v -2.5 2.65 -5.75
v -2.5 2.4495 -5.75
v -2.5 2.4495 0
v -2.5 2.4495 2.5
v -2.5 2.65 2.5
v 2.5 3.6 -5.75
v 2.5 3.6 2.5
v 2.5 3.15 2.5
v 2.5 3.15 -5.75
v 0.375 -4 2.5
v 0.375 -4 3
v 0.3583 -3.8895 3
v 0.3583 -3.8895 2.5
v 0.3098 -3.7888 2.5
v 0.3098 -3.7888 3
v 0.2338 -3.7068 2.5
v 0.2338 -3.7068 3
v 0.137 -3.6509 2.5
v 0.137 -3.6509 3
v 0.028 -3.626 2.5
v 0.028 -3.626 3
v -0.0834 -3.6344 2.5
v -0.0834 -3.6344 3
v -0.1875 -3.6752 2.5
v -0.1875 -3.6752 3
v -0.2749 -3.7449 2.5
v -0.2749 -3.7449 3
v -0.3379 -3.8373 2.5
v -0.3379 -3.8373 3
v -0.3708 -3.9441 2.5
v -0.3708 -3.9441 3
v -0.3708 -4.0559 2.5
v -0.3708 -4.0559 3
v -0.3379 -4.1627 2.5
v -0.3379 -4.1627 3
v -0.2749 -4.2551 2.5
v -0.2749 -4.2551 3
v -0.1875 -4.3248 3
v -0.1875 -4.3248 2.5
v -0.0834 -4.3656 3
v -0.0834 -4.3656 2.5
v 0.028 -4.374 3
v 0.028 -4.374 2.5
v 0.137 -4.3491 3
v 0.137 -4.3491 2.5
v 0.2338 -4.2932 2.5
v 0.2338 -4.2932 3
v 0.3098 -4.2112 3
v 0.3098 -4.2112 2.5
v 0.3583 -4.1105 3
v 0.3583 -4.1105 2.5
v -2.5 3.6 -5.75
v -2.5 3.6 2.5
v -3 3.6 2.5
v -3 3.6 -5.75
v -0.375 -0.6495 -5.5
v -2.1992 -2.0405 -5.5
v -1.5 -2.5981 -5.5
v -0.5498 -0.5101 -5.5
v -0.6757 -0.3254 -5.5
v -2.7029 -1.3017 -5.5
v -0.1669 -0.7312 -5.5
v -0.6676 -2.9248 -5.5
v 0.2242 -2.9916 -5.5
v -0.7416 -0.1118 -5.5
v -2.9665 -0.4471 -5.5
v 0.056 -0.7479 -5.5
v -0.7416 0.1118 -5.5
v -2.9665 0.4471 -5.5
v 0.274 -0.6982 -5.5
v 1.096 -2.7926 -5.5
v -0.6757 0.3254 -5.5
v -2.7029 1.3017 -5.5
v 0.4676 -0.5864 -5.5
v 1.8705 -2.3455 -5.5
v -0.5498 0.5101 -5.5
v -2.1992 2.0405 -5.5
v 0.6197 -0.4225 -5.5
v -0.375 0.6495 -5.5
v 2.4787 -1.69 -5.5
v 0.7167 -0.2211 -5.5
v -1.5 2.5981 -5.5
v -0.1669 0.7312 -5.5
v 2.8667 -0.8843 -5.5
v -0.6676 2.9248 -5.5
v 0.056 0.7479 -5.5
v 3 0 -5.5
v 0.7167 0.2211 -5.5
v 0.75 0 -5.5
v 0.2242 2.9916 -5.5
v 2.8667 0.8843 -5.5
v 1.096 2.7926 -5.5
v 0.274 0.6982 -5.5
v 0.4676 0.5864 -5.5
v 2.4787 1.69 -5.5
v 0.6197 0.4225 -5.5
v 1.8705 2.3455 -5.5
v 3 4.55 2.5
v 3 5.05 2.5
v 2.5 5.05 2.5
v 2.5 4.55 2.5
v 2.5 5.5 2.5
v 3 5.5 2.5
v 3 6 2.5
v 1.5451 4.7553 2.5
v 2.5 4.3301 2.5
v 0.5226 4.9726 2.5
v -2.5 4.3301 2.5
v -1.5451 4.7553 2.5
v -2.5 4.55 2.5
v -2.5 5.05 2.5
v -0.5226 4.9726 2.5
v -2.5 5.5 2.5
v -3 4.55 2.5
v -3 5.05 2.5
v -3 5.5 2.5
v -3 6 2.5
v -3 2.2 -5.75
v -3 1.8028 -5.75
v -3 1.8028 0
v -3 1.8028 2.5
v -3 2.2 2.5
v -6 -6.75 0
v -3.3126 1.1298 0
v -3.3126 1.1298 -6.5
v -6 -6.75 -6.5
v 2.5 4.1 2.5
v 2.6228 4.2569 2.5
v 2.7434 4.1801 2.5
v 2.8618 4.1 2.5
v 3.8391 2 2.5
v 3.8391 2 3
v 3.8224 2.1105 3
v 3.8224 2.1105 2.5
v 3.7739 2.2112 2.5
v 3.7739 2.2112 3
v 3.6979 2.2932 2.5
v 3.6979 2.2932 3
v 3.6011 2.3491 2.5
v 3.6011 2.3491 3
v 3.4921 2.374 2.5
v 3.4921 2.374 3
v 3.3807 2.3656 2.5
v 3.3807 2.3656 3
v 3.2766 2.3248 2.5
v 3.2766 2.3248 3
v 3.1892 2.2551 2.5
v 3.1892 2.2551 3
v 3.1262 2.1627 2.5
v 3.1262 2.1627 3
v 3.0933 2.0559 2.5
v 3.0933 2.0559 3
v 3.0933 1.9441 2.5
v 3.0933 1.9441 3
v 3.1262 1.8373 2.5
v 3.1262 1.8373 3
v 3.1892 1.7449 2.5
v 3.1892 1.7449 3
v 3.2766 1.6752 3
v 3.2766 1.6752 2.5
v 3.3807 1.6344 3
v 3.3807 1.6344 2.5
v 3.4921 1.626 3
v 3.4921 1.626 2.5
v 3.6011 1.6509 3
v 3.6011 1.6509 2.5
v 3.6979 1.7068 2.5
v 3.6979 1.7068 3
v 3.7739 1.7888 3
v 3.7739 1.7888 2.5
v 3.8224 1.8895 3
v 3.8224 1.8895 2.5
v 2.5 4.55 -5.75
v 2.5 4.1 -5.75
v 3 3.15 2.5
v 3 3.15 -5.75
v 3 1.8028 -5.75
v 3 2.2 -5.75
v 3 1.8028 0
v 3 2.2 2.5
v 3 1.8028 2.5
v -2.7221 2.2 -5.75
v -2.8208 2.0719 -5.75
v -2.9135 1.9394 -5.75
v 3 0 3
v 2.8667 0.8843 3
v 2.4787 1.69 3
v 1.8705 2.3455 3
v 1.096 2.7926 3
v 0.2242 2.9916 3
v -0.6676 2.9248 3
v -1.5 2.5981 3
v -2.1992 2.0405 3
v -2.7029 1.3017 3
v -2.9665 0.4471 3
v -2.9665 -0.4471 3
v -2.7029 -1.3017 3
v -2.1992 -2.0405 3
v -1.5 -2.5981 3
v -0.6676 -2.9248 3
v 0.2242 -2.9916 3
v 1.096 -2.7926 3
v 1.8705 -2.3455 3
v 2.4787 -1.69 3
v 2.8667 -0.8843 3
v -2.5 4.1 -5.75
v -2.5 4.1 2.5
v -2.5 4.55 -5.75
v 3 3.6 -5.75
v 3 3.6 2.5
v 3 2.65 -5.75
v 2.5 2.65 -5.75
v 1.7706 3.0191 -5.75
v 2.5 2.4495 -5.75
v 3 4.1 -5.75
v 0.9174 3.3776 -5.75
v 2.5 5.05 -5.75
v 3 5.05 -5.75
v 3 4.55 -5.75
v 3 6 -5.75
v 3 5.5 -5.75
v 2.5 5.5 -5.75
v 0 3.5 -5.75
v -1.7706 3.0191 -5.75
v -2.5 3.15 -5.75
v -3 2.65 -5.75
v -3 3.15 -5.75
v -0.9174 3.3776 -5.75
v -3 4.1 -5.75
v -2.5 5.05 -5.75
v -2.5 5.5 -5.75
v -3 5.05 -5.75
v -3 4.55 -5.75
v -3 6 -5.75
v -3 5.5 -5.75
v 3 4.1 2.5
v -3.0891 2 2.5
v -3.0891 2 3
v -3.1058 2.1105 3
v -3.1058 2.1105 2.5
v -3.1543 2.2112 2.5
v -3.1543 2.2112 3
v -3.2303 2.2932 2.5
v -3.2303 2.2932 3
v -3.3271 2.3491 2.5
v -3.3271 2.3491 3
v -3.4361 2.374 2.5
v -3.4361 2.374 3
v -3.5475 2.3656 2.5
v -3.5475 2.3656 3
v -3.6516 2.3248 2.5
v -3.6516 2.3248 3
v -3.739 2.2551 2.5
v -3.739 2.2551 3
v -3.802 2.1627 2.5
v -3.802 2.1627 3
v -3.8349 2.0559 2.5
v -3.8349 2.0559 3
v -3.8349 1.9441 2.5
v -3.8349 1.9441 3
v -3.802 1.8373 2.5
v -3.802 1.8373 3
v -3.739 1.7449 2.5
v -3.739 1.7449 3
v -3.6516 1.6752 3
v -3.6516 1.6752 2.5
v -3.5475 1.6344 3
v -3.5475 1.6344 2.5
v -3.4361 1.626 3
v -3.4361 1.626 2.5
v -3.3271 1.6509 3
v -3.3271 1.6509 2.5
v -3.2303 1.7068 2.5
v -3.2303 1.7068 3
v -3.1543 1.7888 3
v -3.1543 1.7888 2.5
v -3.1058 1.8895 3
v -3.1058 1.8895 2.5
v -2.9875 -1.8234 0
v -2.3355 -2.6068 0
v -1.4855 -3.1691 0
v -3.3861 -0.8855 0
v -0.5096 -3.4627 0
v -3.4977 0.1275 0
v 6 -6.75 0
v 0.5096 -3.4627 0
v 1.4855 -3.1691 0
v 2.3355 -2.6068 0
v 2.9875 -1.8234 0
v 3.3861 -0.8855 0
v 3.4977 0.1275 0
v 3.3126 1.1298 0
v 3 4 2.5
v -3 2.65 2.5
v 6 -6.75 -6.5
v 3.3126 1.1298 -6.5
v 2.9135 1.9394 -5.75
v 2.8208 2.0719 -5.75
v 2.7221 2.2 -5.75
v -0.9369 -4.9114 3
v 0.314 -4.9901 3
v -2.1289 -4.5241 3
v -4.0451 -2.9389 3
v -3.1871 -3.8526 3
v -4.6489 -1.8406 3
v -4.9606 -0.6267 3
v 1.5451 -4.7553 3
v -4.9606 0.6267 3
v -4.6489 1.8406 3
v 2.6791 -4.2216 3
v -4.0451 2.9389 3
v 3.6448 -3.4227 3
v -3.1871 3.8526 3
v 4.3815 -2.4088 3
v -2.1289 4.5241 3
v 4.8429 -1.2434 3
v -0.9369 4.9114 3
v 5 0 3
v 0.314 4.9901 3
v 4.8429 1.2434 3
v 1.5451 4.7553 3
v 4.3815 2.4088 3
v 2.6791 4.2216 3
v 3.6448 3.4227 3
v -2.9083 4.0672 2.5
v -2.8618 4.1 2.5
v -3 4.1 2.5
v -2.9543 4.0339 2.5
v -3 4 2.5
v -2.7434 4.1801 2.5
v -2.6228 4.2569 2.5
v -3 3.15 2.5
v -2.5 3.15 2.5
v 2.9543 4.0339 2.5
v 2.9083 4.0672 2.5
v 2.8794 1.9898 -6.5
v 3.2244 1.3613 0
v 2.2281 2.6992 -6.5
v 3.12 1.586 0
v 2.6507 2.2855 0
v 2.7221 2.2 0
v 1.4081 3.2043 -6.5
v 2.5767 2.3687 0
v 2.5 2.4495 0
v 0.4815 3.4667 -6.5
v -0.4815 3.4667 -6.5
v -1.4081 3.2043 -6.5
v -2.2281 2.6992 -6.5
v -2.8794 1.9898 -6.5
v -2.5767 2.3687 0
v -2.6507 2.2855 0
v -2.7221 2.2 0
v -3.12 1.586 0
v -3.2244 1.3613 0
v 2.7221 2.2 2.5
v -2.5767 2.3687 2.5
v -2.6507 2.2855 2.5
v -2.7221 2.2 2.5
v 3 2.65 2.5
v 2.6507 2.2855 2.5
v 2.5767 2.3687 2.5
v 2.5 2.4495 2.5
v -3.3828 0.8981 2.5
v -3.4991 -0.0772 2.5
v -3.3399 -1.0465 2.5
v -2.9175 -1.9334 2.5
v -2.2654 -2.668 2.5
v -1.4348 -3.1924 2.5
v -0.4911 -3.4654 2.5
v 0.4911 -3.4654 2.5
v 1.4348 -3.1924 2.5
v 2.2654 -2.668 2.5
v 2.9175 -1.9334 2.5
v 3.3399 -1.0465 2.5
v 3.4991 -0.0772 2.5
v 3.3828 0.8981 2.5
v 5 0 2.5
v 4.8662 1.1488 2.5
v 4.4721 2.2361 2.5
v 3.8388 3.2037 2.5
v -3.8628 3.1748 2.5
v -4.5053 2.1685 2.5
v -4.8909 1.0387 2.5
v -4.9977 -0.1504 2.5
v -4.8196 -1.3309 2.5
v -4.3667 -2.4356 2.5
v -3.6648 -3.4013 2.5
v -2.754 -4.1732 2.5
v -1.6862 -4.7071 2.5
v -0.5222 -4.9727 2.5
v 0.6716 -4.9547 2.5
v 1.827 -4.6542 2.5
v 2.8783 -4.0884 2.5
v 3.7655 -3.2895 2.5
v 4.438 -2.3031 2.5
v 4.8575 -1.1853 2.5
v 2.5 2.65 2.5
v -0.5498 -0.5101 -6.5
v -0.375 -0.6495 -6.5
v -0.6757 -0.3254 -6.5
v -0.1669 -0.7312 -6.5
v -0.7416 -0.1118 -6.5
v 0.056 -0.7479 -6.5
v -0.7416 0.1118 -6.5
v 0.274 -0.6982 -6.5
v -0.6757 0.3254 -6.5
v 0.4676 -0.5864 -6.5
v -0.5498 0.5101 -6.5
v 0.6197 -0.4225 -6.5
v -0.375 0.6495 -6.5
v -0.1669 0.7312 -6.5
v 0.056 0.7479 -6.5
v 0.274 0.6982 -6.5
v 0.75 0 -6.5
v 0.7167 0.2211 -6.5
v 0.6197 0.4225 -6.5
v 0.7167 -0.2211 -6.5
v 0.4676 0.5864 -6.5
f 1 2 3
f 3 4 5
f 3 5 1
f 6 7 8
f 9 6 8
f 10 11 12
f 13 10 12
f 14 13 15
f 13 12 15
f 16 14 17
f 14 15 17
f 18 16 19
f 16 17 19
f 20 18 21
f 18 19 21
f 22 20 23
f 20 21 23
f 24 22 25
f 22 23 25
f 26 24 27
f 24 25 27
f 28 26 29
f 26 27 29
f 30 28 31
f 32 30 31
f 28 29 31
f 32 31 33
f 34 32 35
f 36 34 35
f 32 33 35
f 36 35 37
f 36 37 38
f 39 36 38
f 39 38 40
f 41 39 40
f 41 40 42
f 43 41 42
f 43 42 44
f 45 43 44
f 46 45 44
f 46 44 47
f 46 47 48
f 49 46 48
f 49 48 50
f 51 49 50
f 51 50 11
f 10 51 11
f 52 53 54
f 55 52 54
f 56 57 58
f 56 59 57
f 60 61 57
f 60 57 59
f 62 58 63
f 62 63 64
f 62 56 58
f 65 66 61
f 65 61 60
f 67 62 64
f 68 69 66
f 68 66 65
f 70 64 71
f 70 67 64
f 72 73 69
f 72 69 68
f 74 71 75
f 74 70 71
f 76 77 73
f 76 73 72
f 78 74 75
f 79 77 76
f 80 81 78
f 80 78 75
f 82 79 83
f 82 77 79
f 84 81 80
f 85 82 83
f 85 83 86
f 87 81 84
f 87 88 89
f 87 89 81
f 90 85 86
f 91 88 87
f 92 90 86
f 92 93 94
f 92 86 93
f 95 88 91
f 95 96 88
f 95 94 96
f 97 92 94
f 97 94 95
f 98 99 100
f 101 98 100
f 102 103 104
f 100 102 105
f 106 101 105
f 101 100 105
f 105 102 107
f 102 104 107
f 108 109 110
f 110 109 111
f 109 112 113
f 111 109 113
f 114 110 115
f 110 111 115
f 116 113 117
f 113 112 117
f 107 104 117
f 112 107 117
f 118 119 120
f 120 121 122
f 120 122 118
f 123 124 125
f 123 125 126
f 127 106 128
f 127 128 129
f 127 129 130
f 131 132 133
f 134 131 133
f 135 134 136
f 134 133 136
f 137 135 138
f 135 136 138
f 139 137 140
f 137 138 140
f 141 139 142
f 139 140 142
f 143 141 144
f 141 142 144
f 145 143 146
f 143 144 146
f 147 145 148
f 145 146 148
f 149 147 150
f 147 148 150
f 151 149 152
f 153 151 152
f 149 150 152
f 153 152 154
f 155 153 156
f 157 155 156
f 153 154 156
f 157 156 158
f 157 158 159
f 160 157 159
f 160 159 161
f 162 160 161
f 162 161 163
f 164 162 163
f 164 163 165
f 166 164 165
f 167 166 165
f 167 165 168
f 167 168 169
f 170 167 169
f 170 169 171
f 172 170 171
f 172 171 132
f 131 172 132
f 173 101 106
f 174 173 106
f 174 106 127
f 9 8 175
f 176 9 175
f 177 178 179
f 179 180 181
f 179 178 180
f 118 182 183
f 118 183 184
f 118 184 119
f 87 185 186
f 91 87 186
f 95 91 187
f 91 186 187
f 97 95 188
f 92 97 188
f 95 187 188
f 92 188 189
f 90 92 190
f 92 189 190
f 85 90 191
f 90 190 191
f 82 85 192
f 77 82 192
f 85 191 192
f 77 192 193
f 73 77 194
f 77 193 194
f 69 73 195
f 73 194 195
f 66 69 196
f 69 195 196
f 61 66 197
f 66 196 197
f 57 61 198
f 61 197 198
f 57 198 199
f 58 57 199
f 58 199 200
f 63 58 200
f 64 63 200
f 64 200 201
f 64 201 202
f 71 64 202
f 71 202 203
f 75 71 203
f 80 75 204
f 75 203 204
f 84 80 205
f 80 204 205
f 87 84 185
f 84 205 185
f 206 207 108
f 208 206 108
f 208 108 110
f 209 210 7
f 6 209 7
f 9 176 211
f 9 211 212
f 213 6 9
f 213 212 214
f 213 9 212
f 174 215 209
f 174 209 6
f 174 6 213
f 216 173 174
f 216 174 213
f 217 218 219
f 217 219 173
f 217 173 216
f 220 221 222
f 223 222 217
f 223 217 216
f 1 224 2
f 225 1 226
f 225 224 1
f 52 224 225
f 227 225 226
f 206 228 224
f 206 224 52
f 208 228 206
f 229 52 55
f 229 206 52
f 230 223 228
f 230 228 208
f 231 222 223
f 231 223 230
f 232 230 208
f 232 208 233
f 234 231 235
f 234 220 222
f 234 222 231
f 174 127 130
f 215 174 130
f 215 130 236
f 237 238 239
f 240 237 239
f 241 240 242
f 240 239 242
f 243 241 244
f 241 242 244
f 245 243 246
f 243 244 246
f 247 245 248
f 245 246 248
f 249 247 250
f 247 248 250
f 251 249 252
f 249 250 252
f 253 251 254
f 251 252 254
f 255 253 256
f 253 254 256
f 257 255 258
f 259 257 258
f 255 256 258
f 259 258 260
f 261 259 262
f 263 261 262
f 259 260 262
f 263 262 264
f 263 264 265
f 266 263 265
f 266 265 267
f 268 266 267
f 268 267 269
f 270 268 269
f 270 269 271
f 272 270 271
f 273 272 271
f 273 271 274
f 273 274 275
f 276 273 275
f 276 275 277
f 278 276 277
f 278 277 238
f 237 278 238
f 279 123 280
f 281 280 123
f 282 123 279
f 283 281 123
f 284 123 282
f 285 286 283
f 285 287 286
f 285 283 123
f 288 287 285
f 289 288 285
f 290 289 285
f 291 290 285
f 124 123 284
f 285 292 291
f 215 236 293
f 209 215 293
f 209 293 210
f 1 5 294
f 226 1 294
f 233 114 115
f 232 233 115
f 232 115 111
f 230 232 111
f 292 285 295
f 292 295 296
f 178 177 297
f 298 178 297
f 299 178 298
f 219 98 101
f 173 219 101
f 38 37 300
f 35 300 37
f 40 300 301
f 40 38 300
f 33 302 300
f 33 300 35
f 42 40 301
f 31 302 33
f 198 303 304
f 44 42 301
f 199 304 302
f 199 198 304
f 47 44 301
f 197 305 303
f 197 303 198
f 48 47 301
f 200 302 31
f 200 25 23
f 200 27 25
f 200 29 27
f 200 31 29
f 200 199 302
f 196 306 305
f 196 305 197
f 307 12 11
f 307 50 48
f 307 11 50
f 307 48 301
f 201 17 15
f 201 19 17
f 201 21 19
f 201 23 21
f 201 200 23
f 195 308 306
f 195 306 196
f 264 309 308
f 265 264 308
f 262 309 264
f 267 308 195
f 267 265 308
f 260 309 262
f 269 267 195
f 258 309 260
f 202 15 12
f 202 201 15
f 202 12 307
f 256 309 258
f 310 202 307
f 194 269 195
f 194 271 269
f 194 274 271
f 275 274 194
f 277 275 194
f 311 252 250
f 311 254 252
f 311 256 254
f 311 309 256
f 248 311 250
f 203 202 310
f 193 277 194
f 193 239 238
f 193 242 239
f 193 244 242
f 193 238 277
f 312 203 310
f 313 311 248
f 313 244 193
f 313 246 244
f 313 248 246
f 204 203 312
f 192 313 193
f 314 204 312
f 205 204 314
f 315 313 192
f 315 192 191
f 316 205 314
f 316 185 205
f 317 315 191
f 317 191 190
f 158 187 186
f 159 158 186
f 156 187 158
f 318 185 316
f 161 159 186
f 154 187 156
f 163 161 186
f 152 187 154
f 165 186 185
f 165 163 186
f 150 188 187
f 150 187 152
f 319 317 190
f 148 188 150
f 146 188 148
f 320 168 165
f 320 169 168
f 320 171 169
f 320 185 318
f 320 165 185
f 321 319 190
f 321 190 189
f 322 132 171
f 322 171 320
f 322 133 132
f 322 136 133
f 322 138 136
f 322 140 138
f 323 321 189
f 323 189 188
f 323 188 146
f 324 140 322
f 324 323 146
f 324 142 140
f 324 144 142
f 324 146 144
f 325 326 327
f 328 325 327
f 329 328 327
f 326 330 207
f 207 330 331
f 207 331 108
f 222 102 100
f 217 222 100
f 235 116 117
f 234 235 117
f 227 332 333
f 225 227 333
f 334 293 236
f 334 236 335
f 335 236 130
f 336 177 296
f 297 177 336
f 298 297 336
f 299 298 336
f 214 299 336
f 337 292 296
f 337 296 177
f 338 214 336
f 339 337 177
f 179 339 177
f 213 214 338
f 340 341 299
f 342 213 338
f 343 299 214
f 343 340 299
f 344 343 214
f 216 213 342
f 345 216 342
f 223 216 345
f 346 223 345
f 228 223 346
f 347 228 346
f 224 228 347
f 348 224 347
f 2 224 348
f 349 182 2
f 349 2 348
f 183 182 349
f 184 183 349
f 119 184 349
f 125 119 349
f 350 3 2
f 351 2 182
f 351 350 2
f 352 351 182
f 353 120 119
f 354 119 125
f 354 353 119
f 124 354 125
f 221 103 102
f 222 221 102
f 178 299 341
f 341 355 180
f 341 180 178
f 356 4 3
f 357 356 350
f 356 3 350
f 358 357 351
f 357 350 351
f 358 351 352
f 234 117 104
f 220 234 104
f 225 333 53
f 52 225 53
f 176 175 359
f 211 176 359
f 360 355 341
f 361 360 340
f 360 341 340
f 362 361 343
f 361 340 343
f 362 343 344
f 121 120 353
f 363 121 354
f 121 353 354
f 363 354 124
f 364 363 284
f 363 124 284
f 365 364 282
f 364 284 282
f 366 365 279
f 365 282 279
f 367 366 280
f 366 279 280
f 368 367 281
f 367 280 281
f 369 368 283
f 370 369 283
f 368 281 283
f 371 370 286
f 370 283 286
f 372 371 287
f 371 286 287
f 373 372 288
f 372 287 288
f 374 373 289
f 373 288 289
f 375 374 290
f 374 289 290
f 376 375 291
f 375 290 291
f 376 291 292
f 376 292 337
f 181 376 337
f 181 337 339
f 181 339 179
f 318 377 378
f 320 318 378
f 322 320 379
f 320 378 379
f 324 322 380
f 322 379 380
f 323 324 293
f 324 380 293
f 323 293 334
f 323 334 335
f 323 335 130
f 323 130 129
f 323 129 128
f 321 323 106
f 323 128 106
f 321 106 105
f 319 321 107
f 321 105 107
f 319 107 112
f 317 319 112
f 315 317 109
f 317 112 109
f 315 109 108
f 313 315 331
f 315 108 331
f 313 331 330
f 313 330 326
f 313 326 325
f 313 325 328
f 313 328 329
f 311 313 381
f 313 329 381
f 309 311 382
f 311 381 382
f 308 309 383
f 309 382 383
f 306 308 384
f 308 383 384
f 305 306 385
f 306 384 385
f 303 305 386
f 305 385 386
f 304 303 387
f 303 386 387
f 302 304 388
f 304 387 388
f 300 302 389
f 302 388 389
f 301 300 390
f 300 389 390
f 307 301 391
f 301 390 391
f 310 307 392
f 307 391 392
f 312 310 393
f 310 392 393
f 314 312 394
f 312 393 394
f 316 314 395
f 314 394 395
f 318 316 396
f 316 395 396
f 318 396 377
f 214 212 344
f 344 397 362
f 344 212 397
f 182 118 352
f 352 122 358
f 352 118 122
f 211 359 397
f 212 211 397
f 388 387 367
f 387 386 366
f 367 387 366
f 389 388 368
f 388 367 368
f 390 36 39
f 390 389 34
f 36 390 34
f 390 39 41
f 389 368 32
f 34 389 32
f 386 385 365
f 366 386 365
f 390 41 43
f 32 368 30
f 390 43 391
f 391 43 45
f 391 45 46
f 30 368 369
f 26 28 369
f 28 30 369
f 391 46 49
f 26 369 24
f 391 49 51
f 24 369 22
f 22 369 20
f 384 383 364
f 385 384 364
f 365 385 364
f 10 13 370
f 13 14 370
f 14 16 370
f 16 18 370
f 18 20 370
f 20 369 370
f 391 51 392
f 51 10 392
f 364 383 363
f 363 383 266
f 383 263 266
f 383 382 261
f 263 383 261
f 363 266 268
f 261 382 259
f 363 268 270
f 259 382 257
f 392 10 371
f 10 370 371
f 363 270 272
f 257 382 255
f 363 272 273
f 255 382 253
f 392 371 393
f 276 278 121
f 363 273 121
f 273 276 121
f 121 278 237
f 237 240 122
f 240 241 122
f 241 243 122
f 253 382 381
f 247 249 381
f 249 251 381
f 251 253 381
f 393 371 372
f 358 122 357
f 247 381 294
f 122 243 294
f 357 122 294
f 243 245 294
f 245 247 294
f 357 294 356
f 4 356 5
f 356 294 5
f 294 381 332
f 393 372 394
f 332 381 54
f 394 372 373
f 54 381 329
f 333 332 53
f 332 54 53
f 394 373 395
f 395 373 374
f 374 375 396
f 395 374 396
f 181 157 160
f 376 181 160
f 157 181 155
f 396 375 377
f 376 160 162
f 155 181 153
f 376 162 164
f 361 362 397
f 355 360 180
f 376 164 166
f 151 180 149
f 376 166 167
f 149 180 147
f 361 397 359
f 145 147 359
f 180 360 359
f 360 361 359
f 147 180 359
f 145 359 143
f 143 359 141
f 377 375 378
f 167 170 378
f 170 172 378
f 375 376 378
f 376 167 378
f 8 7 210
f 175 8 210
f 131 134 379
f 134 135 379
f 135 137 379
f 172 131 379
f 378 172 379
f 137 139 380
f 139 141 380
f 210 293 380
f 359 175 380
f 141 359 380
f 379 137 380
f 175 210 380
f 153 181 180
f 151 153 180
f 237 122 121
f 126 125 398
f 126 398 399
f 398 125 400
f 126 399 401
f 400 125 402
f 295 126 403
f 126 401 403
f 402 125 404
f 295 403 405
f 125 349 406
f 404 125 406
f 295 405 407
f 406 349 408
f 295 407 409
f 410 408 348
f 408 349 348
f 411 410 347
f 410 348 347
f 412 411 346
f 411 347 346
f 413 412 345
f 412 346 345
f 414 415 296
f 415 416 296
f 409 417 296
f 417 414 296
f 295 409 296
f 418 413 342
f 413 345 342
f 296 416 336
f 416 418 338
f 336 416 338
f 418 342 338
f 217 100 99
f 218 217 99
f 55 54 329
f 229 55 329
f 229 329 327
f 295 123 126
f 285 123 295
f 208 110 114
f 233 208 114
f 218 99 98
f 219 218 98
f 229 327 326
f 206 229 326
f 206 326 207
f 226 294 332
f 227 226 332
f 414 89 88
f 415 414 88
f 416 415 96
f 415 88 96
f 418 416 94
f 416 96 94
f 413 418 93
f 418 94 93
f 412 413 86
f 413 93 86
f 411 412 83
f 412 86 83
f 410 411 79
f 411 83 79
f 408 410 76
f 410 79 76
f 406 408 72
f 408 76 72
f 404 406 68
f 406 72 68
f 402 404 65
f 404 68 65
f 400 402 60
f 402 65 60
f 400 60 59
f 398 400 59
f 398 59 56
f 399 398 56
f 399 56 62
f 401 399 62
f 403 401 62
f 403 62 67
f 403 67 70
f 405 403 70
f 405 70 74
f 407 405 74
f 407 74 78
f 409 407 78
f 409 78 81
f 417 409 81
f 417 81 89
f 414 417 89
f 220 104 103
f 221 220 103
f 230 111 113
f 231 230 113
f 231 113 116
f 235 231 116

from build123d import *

# Parameters (mm, degrees)
SKETCH1_R           = 0.75
BOSS_EXTRUDE1_DEPTH = 6.5
SKETCH6_R           = 3.5
BOSS_EXTRUDE4_DEPTH = 2.5
SKETCH7_R           = 5
BOSS_EXTRUDE5_DEPTH = 0.5
SKETCH8_R           = 0.75
CUT_EXTRUDE1_DEPTH  = 3
BOSS_EXTRUDE6_START = 2.5
BOSS_EXTRUDE6_DEPTH = 8.25
CUT_EXTRUDE2_REACH  = 11.5
SKETCH11_R          = 0.375
CUT_EXTRUDE3_START  = 3
SKETCH13_R          = 3
CUT_EXTRUDE3_DEPTH  = 8.5


with BuildPart() as part:
    # Sketch1 → Boss-Extrude1 (new body)
    with BuildSketch(Plane.XY):
        with BuildLine():
            Line((-6, -6.75), (6, -6.75))
            Line((6, -6.75), (3.312648335, 1.129761483))
            ThreePointArc((3.312648335, 1.129761483), (0, 3.5), (-3.312648335, 1.129761483))
            Line((-3.312648335, 1.129761483), (-6, -6.75))
        make_face()
        Circle(SKETCH1_R, mode=Mode.SUBTRACT)
    extrude(amount=-BOSS_EXTRUDE1_DEPTH)

    # Sketch6 → Boss-Extrude4 (add)
    with BuildSketch(Plane.XY):
        Circle(SKETCH6_R)
    extrude(amount=BOSS_EXTRUDE4_DEPTH)

    # Sketch7 → Boss-Extrude5 (add)
    with BuildSketch(Plane.XY.offset(2.5)):
        Circle(SKETCH7_R)
    extrude(amount=BOSS_EXTRUDE5_DEPTH)

    # Sketch8 → Cut-Extrude1 (cut)
    with BuildSketch(Plane.XY.offset(3)):
        Circle(SKETCH8_R)
    extrude(amount=-CUT_EXTRUDE1_DEPTH, mode=Mode.SUBTRACT)

    # Sketch10 → Boss-Extrude6 (add)
    with BuildSketch(Plane.XY.offset(BOSS_EXTRUDE6_START)):
        Polygon((-3, 6), (3, 6), (3, 5.5), (2.5, 5.5), (2.5, 5.05), (3, 5.05), (3, 4.55), (2.5, 4.55), (2.5, 4.1), (3, 4.1), (3, 3.6), (2.5, 3.6), (2.5, 3.15), (3, 3.15), (3, 2.65), (2.5, 2.65), (2.5, 2.2), (3, 2.2), (3, 1.7), (-3, 1.7), (-3, 2.2), (-2.5, 2.2), (-2.5, 2.65), (-3, 2.65), (-3, 3.15), (-2.5, 3.15), (-2.5, 3.6), (-3, 3.6), (-3, 4.1), (-2.5, 4.1), (-2.5, 4.55), (-3, 4.55), (-3, 5.05), (-2.5, 5.05), (-2.5, 5.5), (-3, 5.5), align=None)
    extrude(amount=-BOSS_EXTRUDE6_DEPTH)

    # Sketch11 → Cut-Extrude2 (cut, up to next)
    with BuildSketch(Plane.XY.offset(3), mode=Mode.PRIVATE) as cut_extrude2_sk1:
        with Locations((3.464101615, 2)):
            Circle(SKETCH11_R)
    cut_extrude2_tool1 = extrude(cut_extrude2_sk1.sketch, amount=-CUT_EXTRUDE2_REACH, mode=Mode.PRIVATE) & part.part
    add(cut_extrude2_tool1.solids().sort_by_distance((3.464102, 2, 3))[0], mode=Mode.SUBTRACT)
    # Sketch11 → Cut-Extrude2 (cut, up to next)
    with BuildSketch(Plane.XY.offset(3), mode=Mode.PRIVATE) as cut_extrude2_sk2:
        with Locations((0, -4)):
            Circle(SKETCH11_R)
    cut_extrude2_tool2 = extrude(cut_extrude2_sk2.sketch, amount=-CUT_EXTRUDE2_REACH, mode=Mode.PRIVATE) & part.part
    add(cut_extrude2_tool2.solids().sort_by_distance((0, -4, 3))[0], mode=Mode.SUBTRACT)
    # Sketch11 → Cut-Extrude2 (cut, up to next)
    with BuildSketch(Plane.XY.offset(3), mode=Mode.PRIVATE) as cut_extrude2_sk3:
        with Locations((-3.464101615, 2)):
            Circle(SKETCH11_R)
    cut_extrude2_tool3 = extrude(cut_extrude2_sk3.sketch, amount=-CUT_EXTRUDE2_REACH, mode=Mode.PRIVATE) & part.part
    add(cut_extrude2_tool3.solids().sort_by_distance((-3.464102, 2, 3))[0], mode=Mode.SUBTRACT)

    # Sketch13 → Cut-Extrude3 (cut)
    with BuildSketch(Plane.XY.offset(CUT_EXTRUDE3_START)):
        Circle(SKETCH13_R)
    extrude(amount=-CUT_EXTRUDE3_DEPTH, mode=Mode.SUBTRACT)


solid = part.part
